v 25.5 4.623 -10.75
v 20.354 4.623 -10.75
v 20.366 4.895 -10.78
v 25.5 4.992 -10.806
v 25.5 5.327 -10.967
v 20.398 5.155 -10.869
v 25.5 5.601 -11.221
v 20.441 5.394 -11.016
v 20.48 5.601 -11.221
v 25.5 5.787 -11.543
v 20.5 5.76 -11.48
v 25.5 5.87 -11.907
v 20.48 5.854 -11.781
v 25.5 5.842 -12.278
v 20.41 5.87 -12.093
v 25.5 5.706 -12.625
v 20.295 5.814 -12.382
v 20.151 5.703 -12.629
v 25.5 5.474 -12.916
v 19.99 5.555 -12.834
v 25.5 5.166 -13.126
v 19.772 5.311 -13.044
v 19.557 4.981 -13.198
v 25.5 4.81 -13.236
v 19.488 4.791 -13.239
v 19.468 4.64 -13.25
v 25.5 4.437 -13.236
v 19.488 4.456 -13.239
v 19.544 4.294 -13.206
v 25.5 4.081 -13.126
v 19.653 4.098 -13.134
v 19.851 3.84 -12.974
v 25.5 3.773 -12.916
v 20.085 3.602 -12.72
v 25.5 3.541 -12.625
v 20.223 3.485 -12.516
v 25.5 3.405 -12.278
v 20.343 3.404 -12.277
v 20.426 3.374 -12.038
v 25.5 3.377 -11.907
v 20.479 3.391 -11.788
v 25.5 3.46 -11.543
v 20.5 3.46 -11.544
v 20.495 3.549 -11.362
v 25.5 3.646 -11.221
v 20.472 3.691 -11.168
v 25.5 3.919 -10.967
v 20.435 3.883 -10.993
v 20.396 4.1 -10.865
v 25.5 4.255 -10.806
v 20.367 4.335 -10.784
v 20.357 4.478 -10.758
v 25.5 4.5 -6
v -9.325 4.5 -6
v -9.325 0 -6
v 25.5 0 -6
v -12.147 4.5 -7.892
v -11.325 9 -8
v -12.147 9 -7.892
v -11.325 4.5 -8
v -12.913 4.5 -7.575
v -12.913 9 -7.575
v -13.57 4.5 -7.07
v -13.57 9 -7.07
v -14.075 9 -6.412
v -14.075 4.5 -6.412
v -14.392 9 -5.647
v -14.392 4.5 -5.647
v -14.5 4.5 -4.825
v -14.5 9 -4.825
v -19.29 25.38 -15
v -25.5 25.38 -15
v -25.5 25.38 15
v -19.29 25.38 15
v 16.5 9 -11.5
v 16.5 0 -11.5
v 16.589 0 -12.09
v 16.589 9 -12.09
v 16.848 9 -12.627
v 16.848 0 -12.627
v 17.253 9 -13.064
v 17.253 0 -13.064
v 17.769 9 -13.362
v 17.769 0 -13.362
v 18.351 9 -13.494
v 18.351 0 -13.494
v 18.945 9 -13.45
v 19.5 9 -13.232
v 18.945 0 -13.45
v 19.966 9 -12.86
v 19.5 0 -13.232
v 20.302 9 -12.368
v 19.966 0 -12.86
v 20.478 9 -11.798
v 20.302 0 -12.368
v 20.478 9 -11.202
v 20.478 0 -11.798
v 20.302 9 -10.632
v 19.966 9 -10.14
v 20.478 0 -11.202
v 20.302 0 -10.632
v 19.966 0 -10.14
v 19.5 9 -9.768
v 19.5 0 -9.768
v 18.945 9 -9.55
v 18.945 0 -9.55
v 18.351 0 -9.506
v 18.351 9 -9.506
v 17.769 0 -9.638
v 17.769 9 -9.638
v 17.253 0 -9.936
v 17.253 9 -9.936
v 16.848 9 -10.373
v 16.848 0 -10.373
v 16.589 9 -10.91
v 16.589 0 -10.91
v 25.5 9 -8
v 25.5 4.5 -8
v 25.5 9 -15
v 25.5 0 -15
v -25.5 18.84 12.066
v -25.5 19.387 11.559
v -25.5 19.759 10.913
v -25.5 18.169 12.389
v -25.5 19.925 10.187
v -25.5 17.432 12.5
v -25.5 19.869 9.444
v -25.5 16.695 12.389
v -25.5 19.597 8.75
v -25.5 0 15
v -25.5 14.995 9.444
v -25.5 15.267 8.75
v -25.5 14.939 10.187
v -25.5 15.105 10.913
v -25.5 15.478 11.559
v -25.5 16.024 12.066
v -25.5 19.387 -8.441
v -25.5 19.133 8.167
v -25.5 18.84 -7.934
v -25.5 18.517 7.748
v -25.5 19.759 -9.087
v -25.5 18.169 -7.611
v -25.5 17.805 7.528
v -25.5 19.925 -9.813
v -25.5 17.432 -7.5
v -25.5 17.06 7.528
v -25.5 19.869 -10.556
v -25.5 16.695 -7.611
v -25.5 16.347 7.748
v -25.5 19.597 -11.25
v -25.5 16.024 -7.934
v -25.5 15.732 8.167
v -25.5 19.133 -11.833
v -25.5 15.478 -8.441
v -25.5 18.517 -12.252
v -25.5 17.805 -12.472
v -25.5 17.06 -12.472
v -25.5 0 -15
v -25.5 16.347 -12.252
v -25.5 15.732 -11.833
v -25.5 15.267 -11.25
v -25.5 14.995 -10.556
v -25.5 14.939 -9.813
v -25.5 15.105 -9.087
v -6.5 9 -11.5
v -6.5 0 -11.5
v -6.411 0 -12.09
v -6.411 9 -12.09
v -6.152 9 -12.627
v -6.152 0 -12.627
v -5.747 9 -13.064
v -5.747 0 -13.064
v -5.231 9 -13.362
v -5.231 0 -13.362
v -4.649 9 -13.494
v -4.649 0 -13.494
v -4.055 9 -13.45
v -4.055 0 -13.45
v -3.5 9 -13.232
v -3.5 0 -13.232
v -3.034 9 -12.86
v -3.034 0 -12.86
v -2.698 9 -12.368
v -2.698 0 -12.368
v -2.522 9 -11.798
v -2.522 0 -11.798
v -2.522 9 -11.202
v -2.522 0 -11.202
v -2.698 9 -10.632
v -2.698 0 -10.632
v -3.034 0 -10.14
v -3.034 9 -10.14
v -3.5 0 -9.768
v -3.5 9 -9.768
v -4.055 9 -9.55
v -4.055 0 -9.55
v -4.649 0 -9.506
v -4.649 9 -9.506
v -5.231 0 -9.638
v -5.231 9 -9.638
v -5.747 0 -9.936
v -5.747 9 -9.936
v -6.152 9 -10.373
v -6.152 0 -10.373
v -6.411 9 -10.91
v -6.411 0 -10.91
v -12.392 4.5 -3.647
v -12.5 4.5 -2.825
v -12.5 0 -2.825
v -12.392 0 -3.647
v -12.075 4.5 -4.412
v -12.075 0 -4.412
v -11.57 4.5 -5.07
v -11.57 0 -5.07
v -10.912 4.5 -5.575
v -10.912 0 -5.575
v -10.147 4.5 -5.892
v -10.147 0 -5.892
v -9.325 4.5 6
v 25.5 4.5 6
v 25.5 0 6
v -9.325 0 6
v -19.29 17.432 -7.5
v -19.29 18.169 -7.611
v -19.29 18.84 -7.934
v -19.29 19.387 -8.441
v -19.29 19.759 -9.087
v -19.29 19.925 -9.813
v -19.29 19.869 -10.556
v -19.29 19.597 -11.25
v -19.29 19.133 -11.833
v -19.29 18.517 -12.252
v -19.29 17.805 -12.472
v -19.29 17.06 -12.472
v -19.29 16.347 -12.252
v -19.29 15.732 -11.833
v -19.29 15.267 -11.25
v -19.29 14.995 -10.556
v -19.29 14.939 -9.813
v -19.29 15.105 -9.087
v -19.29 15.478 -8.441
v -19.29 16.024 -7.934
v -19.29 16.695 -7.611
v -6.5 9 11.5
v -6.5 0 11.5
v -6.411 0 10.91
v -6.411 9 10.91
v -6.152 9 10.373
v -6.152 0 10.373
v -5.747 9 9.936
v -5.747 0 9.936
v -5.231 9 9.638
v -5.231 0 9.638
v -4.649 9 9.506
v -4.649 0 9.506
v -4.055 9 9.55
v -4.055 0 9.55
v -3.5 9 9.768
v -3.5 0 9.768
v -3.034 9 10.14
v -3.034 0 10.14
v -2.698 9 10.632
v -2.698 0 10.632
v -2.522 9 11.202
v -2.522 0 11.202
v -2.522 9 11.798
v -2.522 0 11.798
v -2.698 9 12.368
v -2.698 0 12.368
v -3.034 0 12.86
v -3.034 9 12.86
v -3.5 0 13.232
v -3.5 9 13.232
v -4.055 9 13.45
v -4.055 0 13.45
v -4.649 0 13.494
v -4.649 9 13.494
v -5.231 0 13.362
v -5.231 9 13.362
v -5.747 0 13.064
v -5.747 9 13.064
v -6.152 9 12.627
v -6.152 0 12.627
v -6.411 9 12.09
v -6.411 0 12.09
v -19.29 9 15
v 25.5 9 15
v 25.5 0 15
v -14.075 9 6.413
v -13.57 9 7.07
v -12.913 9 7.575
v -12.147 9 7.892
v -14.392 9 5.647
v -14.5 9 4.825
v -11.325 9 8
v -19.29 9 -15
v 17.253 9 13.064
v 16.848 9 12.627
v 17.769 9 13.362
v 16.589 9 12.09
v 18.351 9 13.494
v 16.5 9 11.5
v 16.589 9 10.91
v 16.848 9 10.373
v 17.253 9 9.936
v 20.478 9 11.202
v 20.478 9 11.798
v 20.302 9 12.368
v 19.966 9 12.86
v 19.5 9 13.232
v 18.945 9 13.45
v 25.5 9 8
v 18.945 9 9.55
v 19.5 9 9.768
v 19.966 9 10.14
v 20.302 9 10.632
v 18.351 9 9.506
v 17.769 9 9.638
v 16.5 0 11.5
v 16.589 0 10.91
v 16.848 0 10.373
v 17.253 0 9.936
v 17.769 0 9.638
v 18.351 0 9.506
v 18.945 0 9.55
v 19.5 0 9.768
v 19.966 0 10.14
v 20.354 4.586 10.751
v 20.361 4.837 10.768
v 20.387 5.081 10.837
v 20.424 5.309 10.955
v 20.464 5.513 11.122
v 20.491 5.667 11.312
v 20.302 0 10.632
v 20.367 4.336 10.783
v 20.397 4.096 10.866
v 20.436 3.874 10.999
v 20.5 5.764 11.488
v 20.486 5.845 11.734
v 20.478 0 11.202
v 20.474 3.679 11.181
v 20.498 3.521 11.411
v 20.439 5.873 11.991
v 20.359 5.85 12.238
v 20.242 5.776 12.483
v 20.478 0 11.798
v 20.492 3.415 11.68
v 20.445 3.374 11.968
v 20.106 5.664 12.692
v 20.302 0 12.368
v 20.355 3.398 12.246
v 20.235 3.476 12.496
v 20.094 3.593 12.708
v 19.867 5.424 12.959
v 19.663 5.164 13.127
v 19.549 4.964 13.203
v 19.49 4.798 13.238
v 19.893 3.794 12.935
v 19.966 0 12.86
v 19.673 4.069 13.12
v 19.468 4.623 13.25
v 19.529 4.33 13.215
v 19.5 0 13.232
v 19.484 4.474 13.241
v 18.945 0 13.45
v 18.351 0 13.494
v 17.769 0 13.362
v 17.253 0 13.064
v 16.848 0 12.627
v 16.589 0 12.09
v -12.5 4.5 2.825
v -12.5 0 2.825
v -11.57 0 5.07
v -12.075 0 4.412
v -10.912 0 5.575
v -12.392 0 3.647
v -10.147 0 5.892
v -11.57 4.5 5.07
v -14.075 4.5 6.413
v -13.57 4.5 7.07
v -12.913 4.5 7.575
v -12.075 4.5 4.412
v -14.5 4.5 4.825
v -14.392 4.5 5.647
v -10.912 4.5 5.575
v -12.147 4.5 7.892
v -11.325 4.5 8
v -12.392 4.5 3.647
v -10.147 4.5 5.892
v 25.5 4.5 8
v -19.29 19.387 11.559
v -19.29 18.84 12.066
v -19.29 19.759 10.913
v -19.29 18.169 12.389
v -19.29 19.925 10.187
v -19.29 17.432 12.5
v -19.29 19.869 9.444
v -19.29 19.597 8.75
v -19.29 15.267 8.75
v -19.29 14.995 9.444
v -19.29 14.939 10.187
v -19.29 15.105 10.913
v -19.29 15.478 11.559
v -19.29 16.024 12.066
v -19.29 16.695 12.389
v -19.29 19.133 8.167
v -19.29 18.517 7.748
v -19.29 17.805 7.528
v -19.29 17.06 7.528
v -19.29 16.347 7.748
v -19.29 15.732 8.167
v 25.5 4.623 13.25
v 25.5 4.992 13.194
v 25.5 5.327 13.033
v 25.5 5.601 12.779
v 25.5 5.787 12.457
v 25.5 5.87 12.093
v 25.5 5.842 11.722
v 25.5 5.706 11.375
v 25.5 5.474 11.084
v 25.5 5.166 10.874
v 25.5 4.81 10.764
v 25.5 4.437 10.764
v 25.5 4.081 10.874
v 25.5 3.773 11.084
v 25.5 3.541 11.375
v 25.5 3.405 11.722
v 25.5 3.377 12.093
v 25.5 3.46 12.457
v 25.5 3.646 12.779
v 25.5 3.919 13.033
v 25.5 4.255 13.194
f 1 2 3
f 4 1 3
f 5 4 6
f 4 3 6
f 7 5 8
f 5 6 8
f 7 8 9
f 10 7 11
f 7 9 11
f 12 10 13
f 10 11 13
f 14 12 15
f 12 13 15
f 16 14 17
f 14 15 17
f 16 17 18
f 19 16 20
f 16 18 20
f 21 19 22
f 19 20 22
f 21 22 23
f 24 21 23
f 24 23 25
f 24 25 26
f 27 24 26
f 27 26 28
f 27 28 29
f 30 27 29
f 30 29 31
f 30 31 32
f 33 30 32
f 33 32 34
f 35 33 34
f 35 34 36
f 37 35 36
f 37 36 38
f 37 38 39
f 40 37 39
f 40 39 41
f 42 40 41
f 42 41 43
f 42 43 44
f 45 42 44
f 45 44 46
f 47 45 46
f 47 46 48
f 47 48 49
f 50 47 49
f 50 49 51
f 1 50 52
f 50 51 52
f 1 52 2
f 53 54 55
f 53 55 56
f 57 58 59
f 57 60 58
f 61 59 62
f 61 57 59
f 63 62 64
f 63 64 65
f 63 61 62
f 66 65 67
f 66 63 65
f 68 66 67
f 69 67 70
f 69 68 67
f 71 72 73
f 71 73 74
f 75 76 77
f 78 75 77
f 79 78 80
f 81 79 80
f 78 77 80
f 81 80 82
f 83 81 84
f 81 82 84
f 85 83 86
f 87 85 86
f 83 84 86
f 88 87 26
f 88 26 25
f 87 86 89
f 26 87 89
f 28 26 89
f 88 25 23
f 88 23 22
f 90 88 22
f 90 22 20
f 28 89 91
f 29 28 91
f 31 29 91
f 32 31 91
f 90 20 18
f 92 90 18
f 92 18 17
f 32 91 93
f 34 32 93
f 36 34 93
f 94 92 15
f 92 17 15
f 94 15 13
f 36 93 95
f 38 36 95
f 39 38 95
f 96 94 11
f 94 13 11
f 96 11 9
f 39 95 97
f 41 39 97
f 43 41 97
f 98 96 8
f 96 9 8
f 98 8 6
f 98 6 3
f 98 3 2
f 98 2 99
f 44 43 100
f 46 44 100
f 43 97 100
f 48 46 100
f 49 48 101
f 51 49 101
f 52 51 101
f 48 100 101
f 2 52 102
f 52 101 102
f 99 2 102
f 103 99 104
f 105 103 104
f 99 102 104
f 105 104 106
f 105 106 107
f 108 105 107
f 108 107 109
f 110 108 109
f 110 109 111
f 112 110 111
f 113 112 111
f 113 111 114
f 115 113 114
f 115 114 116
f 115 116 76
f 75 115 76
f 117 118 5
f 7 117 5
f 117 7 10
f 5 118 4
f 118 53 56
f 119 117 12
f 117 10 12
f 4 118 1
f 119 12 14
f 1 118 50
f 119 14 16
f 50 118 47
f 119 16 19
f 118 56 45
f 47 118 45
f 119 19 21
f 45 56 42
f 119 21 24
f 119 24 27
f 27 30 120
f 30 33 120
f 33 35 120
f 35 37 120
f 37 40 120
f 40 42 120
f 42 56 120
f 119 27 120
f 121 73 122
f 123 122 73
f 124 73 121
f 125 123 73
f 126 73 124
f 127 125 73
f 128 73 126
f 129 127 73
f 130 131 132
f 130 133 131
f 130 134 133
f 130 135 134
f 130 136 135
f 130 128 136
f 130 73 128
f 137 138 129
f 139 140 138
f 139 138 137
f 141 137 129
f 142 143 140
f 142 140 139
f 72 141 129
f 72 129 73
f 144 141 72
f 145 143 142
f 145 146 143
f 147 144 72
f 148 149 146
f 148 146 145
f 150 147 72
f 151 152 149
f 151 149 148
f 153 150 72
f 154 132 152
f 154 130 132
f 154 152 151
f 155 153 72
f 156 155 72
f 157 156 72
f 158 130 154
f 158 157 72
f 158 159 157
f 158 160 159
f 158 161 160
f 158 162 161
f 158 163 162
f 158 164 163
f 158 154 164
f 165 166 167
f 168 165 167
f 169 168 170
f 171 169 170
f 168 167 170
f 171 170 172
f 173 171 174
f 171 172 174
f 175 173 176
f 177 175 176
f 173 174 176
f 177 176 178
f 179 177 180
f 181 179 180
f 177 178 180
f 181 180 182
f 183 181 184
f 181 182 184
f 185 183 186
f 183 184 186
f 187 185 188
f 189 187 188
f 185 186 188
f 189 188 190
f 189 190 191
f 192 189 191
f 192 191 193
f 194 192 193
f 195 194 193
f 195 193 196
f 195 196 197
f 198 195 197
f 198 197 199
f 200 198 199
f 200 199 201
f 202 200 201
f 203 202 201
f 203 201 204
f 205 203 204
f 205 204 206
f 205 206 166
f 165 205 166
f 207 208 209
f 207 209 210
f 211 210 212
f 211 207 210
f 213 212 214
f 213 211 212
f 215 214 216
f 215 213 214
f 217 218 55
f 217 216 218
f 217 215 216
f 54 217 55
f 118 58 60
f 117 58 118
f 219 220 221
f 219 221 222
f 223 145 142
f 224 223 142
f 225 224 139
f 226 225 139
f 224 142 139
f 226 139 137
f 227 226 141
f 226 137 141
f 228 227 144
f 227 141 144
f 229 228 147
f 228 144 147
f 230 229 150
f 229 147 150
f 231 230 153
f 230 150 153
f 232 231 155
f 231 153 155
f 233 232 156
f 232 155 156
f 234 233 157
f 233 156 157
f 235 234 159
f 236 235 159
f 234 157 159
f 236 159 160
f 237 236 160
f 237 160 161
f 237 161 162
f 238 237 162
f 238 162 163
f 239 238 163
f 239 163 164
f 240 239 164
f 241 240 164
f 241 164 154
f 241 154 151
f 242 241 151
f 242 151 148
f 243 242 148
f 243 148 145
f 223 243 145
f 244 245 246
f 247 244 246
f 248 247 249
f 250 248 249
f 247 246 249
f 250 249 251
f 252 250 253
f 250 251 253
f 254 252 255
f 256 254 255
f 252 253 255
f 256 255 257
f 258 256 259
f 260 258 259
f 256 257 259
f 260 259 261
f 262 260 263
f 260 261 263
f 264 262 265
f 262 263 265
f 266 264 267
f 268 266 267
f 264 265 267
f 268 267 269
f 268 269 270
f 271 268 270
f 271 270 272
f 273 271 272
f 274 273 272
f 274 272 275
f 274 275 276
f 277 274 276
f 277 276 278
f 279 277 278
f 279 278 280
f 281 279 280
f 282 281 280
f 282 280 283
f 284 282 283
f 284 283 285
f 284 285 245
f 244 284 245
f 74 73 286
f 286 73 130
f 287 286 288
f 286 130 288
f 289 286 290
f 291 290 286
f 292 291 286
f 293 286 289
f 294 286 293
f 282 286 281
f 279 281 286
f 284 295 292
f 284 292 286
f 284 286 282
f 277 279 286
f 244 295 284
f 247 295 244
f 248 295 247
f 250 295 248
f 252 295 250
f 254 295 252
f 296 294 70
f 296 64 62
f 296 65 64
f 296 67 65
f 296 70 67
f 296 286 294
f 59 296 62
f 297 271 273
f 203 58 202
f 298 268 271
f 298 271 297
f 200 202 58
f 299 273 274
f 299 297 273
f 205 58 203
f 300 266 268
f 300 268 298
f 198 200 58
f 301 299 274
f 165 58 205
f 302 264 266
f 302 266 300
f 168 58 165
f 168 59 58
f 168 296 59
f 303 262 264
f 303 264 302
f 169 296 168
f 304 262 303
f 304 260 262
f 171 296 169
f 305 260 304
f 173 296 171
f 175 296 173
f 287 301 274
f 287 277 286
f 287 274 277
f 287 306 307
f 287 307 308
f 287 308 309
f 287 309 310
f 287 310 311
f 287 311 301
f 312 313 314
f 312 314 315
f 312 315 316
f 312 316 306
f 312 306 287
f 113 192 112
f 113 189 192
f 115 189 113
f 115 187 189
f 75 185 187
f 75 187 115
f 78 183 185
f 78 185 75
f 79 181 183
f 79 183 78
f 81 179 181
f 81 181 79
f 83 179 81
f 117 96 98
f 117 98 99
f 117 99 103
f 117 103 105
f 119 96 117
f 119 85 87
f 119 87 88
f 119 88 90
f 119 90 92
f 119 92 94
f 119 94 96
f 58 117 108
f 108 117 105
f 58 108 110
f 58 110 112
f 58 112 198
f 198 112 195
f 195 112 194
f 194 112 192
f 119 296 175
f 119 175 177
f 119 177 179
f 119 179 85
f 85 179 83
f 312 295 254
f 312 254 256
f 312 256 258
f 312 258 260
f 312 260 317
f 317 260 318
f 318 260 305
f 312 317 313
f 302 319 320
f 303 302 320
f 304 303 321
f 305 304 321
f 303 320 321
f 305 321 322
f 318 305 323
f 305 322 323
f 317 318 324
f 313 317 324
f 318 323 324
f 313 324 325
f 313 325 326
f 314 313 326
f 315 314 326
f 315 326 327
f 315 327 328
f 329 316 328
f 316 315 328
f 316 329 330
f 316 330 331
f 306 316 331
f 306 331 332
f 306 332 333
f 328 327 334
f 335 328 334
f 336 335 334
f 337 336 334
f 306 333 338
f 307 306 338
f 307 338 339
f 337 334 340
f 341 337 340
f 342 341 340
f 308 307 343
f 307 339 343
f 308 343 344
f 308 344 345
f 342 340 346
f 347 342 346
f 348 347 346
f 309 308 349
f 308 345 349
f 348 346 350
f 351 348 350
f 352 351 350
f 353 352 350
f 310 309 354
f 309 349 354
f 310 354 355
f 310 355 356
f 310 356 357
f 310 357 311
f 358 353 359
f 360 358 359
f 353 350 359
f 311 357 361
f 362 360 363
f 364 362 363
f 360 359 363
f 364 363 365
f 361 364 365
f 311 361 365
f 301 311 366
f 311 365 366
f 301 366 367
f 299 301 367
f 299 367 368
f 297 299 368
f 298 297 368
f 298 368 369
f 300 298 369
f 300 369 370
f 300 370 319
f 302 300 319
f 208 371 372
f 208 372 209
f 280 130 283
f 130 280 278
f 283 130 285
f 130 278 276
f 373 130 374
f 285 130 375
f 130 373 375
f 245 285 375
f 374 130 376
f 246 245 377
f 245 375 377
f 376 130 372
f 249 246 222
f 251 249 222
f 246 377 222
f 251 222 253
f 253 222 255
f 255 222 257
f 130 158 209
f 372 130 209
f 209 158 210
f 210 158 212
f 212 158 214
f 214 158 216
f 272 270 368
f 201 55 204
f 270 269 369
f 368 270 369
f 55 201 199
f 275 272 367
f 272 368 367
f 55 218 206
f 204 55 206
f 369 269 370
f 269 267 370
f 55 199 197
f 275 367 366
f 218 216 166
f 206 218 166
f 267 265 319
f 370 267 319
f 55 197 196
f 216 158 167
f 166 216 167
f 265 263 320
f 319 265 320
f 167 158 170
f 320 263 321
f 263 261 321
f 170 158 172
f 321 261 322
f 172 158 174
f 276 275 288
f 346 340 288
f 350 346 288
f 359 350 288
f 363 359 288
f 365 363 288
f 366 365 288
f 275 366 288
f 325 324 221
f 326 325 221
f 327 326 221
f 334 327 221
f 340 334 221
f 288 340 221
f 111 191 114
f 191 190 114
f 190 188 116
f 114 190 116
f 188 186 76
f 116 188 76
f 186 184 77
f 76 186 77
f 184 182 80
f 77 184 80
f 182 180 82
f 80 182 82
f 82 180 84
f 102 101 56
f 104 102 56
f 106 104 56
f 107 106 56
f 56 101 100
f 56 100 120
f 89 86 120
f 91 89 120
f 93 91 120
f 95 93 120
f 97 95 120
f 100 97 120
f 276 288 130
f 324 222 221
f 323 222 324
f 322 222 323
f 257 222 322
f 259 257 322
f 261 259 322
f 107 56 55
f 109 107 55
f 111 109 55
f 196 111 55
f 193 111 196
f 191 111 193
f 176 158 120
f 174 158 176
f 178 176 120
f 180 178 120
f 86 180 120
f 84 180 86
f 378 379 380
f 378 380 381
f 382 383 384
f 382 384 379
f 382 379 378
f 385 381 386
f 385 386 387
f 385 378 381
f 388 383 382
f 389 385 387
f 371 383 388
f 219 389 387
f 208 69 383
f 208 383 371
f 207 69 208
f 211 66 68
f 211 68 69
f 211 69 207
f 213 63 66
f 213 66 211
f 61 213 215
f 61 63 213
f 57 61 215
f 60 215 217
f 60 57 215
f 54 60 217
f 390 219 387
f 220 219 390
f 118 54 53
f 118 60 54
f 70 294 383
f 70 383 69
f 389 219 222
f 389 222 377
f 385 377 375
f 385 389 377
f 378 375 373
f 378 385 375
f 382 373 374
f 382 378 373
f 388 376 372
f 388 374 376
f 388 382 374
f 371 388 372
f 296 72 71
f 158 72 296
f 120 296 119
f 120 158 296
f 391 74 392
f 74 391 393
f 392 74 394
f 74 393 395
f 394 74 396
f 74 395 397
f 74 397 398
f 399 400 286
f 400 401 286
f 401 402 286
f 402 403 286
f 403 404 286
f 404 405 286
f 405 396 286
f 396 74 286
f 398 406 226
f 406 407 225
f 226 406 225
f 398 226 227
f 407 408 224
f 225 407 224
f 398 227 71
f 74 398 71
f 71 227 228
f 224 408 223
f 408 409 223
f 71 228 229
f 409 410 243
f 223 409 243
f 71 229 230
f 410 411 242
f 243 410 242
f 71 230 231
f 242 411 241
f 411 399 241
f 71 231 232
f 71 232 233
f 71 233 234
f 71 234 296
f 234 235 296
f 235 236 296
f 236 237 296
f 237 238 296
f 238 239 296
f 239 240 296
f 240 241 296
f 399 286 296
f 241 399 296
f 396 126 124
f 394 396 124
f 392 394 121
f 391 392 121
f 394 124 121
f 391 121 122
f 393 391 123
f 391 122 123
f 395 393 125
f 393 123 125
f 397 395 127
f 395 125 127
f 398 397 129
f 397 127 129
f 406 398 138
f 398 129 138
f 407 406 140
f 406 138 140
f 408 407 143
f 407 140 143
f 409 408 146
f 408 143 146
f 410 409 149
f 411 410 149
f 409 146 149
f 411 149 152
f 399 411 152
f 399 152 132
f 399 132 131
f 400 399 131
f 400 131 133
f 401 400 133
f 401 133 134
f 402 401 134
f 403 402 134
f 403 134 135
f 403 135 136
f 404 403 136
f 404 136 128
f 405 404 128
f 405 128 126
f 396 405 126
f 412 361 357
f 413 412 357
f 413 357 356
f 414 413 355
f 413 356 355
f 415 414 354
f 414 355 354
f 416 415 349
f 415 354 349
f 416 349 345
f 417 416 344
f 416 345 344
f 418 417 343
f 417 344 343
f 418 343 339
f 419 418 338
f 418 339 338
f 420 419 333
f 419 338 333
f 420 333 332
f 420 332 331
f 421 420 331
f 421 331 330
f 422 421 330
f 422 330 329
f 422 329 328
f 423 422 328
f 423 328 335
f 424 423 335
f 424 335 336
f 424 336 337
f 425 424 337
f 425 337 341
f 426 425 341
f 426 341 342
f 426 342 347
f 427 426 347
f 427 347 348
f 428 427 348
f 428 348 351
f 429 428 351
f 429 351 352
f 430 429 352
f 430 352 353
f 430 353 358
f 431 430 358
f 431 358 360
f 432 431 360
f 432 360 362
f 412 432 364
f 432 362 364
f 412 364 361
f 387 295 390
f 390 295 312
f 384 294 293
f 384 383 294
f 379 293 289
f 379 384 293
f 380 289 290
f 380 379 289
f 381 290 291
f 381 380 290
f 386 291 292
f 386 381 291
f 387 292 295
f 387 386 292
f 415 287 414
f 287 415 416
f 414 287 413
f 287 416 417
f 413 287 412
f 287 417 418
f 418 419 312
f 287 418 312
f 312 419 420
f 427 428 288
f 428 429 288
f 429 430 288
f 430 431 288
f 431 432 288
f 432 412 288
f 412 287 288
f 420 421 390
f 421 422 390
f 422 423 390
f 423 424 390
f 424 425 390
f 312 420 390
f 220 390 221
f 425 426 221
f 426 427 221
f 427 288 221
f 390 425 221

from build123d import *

# Parameters (mm, degrees)
SKETCH1_W                    = 51
SKETCH1_H                    = 30
BOSS_EXTRUDE1_DEPTH          = 9
SKETCH2_W                    = 6.21
SKETCH2_H                    = 30
BOSS_EXTRUDE2_DEPTH          = 16.38
SKETCH3_W                    = 40
SKETCH3_H                    = 16
CUT_EXTRUDE1_DEPTH           = 4.5
FILLET1_R                    = 3.175
CUT_EXTRUDE2_DEPTH           = 37.210832633
F_5_0_5_DIAMETER_HOLE1_D     = 5
F_5_0_5_DIAMETER_HOLE1_DEPTH = 10
F_5_0_5_DIAMETER_HOLE1_TIP   = 1.502151548
F_4_0_4_DIAMETER_HOLE1_D     = 4
F_4_0_4_DIAMETER_HOLE1_DEPTH = 10
F_4_0_4_DIAMETER_HOLE1_TIP   = 1.201721238
M3X0_5_TAPPED_HOLE1_D        = 2.5
M3X0_5_TAPPED_HOLE1_DEPTH    = 7
M3X0_5_TAPPED_HOLE1_TIP      = 0.751075774


with BuildPart() as part:
    # Sketch1 → Boss-Extrude1 (new body)
    with BuildSketch(Plane(origin=(0, 0, 0), x_dir=(1, 0, 0), z_dir=(0, 1, 0))):
        Rectangle(SKETCH1_W, SKETCH1_H)
    extrude(amount=BOSS_EXTRUDE1_DEPTH)

    # Sketch2 → Boss-Extrude2 (add)
    with BuildSketch(Plane(origin=(0, 9, 0), x_dir=(1, 0, 0), z_dir=(0, 1, 0))):
        with Locations((-22.395, 0)):
            Rectangle(SKETCH2_W, SKETCH2_H)
    extrude(amount=BOSS_EXTRUDE2_DEPTH)

    # Sketch3 → Cut-Extrude1 (cut)
    with BuildSketch(Plane(origin=(0, 9, 0), x_dir=(1, 0, 0), z_dir=(0, 1, 0))):
        with Locations((5.5, 0)):
            Rectangle(SKETCH3_W, SKETCH3_H)
    extrude(amount=-CUT_EXTRUDE1_DEPTH, mode=Mode.SUBTRACT)

    # Fillet1
    fillet1_edges = [part.edges().sort_by_distance(p)[0] for p in [
        (-14.5, 6.75, 8),
        (-14.5, 6.75, -8),
    ]]
    fillet(fillet1_edges, radius=FILLET1_R)

    # Sketch5 → Cut-Extrude2 (cut, through all)
    with BuildSketch(Plane(origin=(0, 4.5, 0), x_dir=(1, 0, 0), z_dir=(0, 1, 0))):
        with BuildLine():
            Line((25.5, -6), (-9.325, -6))
            ThreePointArc((-9.325, -6), (-11.57006403, -5.07006403), (-12.5, -2.825))
            Line((-12.5, -2.825), (-12.5, 2.825))
            ThreePointArc((-12.5, 2.825), (-11.57006403, 5.07006403), (-9.325, 6))
            Line((-9.325, 6), (25.5, 6))
            Line((25.5, 6), (25.5, -6))
        make_face()
    extrude(amount=-CUT_EXTRUDE2_DEPTH, mode=Mode.SUBTRACT)

    # Ø5.0 (5) Diameter Hole1
    with Locations(Plane(origin=(-19.29, 0, 0), x_dir=(0, 0, -1), z_dir=(1, 0, 0))):
        with Locations((-10, 17.432129573), (10, 17.432129573)):
            Hole(F_5_0_5_DIAMETER_HOLE1_D / 2, depth=F_5_0_5_DIAMETER_HOLE1_DEPTH)
            with Locations((0, 0, -(F_5_0_5_DIAMETER_HOLE1_DEPTH + F_5_0_5_DIAMETER_HOLE1_TIP / 2))):  # 118° drill point
                Cone(0, F_5_0_5_DIAMETER_HOLE1_D / 2, F_5_0_5_DIAMETER_HOLE1_TIP, mode=Mode.SUBTRACT)

    # Ø4.0 (4) Diameter Hole1
    with Locations(Plane(origin=(0, 9, 0), x_dir=(1, 0, 0), z_dir=(0, 1, 0))):
        with Locations((73.579545509, -261.26638596), (-4.5, -11.5), (18.5, -11.5), (18.5, 11.5), (-4.5, 11.5)):
            Hole(F_4_0_4_DIAMETER_HOLE1_D / 2, depth=F_4_0_4_DIAMETER_HOLE1_DEPTH)
            with Locations((0, 0, -(F_4_0_4_DIAMETER_HOLE1_DEPTH + F_4_0_4_DIAMETER_HOLE1_TIP / 2))):  # 118° drill point
                Cone(0, F_4_0_4_DIAMETER_HOLE1_D / 2, F_4_0_4_DIAMETER_HOLE1_TIP, mode=Mode.SUBTRACT)

    # M3x0.5 Tapped Hole1
    with Locations(Plane(origin=(25.5, 0, 0), x_dir=(0, 0, -1), z_dir=(1, 0, 0))):
        with Locations((-12, 4.623330266), (12, 4.623330266)):
            Hole(M3X0_5_TAPPED_HOLE1_D / 2, depth=M3X0_5_TAPPED_HOLE1_DEPTH)
            with Locations((0, 0, -(M3X0_5_TAPPED_HOLE1_DEPTH + M3X0_5_TAPPED_HOLE1_TIP / 2))):  # 118° drill point
                Cone(0, M3X0_5_TAPPED_HOLE1_D / 2, M3X0_5_TAPPED_HOLE1_TIP, mode=Mode.SUBTRACT)


solid = part.part
